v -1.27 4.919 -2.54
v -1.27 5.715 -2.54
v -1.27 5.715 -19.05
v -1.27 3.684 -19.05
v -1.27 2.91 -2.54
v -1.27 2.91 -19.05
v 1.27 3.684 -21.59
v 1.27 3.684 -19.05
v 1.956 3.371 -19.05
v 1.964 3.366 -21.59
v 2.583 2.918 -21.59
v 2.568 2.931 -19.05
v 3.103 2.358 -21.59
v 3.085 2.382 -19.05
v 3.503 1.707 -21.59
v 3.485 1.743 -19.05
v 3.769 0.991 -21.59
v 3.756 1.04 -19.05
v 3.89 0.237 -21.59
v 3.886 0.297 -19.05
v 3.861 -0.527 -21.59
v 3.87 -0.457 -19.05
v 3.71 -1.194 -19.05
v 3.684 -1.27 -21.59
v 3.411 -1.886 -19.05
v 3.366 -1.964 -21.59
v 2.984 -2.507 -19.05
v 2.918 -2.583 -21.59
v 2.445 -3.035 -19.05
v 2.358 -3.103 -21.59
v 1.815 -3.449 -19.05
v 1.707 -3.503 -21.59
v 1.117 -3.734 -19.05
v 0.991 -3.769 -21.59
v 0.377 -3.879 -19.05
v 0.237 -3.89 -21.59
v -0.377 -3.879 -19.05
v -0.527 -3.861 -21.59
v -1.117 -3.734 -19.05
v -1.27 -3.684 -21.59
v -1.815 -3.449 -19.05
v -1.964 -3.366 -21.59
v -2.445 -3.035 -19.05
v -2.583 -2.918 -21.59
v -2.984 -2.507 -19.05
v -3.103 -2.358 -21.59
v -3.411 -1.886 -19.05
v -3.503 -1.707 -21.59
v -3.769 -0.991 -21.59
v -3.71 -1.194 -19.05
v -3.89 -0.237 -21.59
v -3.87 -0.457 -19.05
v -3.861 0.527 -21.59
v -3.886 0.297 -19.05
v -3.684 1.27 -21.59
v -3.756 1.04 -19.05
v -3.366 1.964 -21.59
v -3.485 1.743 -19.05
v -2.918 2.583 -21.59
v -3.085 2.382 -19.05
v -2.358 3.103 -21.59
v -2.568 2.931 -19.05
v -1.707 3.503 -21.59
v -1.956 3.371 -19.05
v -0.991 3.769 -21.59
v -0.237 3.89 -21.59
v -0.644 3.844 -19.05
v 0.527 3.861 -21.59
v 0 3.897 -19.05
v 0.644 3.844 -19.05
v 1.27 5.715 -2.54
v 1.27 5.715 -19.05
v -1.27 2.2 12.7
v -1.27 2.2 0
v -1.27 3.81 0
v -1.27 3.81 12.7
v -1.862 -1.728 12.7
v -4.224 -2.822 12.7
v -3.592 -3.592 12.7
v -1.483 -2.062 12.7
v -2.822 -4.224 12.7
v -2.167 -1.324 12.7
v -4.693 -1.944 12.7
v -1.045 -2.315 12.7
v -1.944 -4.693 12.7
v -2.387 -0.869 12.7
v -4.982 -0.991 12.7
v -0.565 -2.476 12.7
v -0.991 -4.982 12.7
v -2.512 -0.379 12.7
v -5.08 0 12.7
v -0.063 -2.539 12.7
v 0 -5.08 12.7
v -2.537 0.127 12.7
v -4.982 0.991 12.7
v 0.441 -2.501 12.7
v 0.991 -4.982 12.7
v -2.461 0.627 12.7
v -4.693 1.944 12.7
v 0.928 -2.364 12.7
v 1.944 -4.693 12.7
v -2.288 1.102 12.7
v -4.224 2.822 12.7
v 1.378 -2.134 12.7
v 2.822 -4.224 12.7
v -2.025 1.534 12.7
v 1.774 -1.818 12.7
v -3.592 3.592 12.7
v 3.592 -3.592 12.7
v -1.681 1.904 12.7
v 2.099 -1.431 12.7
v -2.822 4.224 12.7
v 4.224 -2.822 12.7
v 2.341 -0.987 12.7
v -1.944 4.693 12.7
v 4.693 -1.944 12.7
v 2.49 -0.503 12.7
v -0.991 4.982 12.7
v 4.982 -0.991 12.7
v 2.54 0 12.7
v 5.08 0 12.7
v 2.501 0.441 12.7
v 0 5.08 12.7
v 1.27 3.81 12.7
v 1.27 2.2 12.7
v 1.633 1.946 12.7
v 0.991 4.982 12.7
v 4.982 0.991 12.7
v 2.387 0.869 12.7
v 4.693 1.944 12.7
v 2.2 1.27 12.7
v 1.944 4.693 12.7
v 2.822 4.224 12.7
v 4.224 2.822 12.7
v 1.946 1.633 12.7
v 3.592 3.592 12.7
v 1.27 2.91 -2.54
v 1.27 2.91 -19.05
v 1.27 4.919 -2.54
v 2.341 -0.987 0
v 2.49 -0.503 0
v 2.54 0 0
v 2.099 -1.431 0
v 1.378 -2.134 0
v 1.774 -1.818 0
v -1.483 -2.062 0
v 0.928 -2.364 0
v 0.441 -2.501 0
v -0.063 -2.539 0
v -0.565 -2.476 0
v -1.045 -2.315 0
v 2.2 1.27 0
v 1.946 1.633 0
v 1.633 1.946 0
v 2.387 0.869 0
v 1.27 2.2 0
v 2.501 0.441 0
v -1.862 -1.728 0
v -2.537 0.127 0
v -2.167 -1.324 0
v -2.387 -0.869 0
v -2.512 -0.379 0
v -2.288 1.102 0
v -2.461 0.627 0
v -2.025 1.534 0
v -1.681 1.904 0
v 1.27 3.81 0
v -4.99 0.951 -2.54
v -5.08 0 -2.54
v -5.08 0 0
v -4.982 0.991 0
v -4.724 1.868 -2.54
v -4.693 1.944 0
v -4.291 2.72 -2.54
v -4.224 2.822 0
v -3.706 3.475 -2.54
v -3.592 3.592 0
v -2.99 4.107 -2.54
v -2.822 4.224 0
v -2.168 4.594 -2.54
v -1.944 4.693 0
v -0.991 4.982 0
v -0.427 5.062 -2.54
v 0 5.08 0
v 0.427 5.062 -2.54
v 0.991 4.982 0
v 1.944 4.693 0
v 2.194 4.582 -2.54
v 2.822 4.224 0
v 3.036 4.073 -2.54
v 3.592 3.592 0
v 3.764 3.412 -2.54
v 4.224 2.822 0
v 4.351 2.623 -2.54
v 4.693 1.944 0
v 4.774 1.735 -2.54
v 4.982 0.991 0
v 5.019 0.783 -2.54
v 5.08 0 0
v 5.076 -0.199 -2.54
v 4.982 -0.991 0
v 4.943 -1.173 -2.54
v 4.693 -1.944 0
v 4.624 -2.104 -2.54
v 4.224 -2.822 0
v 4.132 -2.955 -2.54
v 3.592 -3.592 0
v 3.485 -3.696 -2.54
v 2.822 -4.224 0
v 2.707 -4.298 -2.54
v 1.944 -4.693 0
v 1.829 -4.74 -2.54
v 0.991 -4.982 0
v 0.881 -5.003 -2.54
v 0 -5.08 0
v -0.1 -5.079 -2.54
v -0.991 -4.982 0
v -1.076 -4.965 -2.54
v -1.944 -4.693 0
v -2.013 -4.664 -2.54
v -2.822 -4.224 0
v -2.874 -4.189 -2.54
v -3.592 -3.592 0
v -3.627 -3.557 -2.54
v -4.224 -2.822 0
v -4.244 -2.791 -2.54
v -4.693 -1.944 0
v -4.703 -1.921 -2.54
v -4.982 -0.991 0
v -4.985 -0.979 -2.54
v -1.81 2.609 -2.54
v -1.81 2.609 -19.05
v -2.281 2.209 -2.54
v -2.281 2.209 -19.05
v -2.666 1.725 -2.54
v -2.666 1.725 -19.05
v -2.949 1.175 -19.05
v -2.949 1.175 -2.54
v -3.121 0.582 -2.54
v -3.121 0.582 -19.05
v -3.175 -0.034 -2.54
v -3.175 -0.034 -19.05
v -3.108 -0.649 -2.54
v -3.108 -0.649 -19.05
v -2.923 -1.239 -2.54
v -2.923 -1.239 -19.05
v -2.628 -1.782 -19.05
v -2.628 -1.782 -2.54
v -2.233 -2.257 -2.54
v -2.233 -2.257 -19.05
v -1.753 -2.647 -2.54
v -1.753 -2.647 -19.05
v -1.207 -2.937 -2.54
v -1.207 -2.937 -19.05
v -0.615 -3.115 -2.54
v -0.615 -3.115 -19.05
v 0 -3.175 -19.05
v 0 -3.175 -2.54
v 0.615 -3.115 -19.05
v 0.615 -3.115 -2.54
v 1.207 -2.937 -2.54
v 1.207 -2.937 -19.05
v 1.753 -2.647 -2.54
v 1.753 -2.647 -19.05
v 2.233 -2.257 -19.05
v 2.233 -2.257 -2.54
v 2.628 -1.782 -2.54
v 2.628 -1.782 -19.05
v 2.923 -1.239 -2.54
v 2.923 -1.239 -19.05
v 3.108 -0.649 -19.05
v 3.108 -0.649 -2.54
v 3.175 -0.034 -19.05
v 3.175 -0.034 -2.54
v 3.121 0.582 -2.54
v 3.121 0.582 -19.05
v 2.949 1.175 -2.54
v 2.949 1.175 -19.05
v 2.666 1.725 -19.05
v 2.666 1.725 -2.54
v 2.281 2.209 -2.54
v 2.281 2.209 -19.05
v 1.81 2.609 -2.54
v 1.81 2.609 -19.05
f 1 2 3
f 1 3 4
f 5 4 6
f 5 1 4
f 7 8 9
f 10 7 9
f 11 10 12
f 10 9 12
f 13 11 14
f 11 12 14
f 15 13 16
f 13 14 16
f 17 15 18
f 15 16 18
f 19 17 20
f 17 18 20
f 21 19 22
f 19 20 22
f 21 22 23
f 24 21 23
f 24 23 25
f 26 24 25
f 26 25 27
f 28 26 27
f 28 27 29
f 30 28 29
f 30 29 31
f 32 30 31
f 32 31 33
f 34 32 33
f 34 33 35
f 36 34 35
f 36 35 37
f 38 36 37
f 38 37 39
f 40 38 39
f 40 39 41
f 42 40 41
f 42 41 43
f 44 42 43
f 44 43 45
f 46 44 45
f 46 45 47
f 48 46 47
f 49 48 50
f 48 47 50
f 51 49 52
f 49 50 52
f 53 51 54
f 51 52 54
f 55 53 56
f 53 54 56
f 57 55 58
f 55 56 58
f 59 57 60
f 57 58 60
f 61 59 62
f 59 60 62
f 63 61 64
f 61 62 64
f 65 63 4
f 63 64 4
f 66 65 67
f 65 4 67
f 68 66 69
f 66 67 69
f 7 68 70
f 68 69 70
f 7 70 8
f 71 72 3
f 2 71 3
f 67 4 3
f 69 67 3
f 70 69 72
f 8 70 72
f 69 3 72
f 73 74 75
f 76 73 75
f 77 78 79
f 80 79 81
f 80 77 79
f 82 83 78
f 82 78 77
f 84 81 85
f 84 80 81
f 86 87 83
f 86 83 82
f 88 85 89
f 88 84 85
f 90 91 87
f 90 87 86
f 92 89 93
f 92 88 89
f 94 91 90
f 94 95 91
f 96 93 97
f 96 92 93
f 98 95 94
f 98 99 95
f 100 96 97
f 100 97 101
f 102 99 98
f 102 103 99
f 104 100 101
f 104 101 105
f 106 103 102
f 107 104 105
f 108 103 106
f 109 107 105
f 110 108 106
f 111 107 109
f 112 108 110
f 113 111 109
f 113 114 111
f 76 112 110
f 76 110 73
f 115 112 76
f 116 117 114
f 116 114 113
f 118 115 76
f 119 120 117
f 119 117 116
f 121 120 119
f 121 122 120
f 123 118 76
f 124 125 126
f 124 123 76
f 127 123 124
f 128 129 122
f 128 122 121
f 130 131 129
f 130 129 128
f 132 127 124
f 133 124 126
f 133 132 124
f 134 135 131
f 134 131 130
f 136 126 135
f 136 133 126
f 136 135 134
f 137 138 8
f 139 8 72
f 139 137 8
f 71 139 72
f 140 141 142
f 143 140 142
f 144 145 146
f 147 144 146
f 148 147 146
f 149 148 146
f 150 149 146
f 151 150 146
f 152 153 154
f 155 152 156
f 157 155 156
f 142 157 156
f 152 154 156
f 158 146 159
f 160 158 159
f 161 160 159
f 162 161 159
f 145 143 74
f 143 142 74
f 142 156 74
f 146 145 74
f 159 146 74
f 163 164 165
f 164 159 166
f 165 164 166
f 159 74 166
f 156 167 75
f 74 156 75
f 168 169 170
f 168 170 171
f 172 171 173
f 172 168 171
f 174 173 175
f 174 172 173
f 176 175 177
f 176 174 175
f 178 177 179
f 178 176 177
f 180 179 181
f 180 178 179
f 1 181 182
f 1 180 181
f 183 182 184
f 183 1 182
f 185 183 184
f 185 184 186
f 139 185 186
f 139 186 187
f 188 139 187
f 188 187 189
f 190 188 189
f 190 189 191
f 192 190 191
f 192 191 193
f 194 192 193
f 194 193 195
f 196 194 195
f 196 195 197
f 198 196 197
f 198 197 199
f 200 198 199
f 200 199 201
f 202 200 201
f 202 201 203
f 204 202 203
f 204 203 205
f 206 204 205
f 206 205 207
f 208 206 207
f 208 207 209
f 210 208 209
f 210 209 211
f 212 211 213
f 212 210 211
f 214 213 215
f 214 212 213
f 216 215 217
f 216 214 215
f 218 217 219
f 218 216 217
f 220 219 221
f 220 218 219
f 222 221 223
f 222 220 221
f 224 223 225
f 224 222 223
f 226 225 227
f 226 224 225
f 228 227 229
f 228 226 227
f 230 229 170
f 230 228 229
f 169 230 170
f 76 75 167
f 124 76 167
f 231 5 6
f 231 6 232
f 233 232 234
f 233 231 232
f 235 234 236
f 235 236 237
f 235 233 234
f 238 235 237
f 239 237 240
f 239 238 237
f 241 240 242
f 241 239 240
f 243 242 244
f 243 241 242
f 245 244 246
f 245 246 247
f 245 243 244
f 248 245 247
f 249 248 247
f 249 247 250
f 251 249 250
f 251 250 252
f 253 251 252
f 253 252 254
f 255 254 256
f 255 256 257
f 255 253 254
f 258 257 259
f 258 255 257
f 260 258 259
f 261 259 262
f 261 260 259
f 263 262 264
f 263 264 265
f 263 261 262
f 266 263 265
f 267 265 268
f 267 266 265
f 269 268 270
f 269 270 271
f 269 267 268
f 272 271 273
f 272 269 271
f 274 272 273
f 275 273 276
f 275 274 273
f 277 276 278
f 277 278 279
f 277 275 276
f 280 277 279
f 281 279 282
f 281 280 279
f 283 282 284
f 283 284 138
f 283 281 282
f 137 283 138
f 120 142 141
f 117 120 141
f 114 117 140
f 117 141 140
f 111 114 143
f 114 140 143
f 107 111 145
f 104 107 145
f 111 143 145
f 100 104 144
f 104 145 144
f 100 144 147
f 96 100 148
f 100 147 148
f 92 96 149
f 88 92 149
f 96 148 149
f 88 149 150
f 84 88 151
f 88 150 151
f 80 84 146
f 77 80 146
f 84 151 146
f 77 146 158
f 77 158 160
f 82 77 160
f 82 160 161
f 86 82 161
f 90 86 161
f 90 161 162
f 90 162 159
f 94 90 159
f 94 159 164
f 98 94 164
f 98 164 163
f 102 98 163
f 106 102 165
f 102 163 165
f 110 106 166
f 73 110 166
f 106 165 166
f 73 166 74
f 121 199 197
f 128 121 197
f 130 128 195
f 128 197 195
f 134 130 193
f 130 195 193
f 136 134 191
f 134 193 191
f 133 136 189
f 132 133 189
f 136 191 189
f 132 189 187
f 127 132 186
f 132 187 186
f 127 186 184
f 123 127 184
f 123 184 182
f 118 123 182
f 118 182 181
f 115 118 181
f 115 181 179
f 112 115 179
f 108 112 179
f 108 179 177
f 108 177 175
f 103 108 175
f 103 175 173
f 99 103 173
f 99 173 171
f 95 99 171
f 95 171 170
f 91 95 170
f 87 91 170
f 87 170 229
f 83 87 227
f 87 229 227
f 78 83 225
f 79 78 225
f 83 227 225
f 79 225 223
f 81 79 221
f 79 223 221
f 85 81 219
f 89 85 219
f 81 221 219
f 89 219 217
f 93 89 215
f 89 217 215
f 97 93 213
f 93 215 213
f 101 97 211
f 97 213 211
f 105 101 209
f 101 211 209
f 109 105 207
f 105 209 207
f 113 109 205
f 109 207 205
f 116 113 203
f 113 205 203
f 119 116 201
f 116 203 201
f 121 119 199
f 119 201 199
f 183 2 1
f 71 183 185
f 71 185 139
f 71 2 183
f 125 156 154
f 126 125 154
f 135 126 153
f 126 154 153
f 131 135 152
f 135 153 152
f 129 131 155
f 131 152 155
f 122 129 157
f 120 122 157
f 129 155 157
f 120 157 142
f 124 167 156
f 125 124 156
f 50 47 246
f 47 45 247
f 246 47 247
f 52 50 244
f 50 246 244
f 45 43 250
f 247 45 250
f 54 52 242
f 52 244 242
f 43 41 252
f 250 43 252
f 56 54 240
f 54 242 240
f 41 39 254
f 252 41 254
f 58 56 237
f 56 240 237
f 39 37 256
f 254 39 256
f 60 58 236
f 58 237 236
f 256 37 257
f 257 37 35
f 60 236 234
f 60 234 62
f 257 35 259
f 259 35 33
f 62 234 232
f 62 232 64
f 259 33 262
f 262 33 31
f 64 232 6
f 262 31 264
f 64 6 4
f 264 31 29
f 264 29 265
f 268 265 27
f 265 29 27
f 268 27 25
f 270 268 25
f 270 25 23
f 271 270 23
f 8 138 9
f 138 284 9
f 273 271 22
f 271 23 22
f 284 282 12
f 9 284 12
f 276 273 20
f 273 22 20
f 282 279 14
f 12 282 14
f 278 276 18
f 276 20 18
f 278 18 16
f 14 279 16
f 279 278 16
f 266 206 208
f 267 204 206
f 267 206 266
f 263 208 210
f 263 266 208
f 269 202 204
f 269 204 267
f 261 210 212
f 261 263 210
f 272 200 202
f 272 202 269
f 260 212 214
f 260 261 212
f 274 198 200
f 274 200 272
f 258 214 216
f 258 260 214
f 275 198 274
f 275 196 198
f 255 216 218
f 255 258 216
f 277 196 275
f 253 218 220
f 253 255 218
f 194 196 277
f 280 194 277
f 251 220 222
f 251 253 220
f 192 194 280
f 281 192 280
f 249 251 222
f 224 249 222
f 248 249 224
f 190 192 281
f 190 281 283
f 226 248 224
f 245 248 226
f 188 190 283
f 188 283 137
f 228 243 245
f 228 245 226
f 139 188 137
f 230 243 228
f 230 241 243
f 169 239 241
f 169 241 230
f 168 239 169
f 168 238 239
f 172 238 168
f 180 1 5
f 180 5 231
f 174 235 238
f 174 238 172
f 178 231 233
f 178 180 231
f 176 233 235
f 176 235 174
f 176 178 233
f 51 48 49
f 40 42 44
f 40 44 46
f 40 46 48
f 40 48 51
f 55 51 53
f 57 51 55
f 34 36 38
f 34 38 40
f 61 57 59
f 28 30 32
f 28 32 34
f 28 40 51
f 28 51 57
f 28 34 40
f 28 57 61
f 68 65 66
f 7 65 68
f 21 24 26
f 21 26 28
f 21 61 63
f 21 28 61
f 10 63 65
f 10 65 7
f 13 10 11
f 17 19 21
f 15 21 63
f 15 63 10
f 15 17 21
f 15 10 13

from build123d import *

# Parameters (mm, degrees)
SKETCH1_R           = 5.08
BOSS_EXTRUDE1_DEPTH = 12.7
BOSS_EXTRUDE5_START = 2.54
SKETCH3_R           = 5.08
BOSS_EXTRUDE5_DEPTH = 2.54
BOSS_EXTRUDE7_DEPTH = 16.51
SKETCH6_R           = 3.897142563
BOSS_EXTRUDE8_DEPTH = 2.54


with BuildPart() as part:
    # Sketch1 → Boss-Extrude1 (new body)
    with BuildSketch(Plane.XY):
        Circle(SKETCH1_R)
        with BuildLine():
            Line((-1.27, 2.199704526), (-1.27, 3.81))
            Line((-1.27, 3.81), (1.27, 3.81))
            Line((1.27, 3.81), (1.27, 2.199704526))
            ThreePointArc((1.27, 2.199704526), (2.199704526, 1.27), (2.54, 0))
            ThreePointArc((2.54, 0), (-1.27, -2.199704526), (-1.27, 2.199704526))
        make_face(mode=Mode.SUBTRACT)
    extrude(amount=BOSS_EXTRUDE1_DEPTH)

    # Sketch3 → Boss-Extrude5 (add)
    with BuildSketch(Plane(origin=(0, 0, 0), x_dir=(-1, 0, 0), z_dir=(0, 0, -1)).offset(BOSS_EXTRUDE5_START)):
        Circle(SKETCH3_R)
    extrude(amount=-BOSS_EXTRUDE5_DEPTH)

    # Sketch5 → Boss-Extrude7 (add)
    with BuildSketch(Plane(origin=(0, 0, -2.54), x_dir=(-1, 0, 0), z_dir=(0, 0, -1))):
        with BuildLine():
            Line((-1.27, 5.715), (1.27, 5.715))
            Line((1.27, 5.715), (1.27, 2.909935566))
            ThreePointArc((1.27, 2.909935566), (0, -3.175), (-1.27, 2.909935566))
            Line((-1.27, 2.909935566), (-1.27, 5.715))
        make_face()
    extrude(amount=BOSS_EXTRUDE7_DEPTH)

    # Sketch6 → Boss-Extrude8 (add)
    with BuildSketch(Plane(origin=(0, 0, -19.05), x_dir=(-1, 0, 0), z_dir=(0, 0, -1))):
        with Locations(Location((0, 0, 0), (0, 0, 109.018885315))):
            Circle(SKETCH6_R)
    extrude(amount=BOSS_EXTRUDE8_DEPTH)


solid = part.part
